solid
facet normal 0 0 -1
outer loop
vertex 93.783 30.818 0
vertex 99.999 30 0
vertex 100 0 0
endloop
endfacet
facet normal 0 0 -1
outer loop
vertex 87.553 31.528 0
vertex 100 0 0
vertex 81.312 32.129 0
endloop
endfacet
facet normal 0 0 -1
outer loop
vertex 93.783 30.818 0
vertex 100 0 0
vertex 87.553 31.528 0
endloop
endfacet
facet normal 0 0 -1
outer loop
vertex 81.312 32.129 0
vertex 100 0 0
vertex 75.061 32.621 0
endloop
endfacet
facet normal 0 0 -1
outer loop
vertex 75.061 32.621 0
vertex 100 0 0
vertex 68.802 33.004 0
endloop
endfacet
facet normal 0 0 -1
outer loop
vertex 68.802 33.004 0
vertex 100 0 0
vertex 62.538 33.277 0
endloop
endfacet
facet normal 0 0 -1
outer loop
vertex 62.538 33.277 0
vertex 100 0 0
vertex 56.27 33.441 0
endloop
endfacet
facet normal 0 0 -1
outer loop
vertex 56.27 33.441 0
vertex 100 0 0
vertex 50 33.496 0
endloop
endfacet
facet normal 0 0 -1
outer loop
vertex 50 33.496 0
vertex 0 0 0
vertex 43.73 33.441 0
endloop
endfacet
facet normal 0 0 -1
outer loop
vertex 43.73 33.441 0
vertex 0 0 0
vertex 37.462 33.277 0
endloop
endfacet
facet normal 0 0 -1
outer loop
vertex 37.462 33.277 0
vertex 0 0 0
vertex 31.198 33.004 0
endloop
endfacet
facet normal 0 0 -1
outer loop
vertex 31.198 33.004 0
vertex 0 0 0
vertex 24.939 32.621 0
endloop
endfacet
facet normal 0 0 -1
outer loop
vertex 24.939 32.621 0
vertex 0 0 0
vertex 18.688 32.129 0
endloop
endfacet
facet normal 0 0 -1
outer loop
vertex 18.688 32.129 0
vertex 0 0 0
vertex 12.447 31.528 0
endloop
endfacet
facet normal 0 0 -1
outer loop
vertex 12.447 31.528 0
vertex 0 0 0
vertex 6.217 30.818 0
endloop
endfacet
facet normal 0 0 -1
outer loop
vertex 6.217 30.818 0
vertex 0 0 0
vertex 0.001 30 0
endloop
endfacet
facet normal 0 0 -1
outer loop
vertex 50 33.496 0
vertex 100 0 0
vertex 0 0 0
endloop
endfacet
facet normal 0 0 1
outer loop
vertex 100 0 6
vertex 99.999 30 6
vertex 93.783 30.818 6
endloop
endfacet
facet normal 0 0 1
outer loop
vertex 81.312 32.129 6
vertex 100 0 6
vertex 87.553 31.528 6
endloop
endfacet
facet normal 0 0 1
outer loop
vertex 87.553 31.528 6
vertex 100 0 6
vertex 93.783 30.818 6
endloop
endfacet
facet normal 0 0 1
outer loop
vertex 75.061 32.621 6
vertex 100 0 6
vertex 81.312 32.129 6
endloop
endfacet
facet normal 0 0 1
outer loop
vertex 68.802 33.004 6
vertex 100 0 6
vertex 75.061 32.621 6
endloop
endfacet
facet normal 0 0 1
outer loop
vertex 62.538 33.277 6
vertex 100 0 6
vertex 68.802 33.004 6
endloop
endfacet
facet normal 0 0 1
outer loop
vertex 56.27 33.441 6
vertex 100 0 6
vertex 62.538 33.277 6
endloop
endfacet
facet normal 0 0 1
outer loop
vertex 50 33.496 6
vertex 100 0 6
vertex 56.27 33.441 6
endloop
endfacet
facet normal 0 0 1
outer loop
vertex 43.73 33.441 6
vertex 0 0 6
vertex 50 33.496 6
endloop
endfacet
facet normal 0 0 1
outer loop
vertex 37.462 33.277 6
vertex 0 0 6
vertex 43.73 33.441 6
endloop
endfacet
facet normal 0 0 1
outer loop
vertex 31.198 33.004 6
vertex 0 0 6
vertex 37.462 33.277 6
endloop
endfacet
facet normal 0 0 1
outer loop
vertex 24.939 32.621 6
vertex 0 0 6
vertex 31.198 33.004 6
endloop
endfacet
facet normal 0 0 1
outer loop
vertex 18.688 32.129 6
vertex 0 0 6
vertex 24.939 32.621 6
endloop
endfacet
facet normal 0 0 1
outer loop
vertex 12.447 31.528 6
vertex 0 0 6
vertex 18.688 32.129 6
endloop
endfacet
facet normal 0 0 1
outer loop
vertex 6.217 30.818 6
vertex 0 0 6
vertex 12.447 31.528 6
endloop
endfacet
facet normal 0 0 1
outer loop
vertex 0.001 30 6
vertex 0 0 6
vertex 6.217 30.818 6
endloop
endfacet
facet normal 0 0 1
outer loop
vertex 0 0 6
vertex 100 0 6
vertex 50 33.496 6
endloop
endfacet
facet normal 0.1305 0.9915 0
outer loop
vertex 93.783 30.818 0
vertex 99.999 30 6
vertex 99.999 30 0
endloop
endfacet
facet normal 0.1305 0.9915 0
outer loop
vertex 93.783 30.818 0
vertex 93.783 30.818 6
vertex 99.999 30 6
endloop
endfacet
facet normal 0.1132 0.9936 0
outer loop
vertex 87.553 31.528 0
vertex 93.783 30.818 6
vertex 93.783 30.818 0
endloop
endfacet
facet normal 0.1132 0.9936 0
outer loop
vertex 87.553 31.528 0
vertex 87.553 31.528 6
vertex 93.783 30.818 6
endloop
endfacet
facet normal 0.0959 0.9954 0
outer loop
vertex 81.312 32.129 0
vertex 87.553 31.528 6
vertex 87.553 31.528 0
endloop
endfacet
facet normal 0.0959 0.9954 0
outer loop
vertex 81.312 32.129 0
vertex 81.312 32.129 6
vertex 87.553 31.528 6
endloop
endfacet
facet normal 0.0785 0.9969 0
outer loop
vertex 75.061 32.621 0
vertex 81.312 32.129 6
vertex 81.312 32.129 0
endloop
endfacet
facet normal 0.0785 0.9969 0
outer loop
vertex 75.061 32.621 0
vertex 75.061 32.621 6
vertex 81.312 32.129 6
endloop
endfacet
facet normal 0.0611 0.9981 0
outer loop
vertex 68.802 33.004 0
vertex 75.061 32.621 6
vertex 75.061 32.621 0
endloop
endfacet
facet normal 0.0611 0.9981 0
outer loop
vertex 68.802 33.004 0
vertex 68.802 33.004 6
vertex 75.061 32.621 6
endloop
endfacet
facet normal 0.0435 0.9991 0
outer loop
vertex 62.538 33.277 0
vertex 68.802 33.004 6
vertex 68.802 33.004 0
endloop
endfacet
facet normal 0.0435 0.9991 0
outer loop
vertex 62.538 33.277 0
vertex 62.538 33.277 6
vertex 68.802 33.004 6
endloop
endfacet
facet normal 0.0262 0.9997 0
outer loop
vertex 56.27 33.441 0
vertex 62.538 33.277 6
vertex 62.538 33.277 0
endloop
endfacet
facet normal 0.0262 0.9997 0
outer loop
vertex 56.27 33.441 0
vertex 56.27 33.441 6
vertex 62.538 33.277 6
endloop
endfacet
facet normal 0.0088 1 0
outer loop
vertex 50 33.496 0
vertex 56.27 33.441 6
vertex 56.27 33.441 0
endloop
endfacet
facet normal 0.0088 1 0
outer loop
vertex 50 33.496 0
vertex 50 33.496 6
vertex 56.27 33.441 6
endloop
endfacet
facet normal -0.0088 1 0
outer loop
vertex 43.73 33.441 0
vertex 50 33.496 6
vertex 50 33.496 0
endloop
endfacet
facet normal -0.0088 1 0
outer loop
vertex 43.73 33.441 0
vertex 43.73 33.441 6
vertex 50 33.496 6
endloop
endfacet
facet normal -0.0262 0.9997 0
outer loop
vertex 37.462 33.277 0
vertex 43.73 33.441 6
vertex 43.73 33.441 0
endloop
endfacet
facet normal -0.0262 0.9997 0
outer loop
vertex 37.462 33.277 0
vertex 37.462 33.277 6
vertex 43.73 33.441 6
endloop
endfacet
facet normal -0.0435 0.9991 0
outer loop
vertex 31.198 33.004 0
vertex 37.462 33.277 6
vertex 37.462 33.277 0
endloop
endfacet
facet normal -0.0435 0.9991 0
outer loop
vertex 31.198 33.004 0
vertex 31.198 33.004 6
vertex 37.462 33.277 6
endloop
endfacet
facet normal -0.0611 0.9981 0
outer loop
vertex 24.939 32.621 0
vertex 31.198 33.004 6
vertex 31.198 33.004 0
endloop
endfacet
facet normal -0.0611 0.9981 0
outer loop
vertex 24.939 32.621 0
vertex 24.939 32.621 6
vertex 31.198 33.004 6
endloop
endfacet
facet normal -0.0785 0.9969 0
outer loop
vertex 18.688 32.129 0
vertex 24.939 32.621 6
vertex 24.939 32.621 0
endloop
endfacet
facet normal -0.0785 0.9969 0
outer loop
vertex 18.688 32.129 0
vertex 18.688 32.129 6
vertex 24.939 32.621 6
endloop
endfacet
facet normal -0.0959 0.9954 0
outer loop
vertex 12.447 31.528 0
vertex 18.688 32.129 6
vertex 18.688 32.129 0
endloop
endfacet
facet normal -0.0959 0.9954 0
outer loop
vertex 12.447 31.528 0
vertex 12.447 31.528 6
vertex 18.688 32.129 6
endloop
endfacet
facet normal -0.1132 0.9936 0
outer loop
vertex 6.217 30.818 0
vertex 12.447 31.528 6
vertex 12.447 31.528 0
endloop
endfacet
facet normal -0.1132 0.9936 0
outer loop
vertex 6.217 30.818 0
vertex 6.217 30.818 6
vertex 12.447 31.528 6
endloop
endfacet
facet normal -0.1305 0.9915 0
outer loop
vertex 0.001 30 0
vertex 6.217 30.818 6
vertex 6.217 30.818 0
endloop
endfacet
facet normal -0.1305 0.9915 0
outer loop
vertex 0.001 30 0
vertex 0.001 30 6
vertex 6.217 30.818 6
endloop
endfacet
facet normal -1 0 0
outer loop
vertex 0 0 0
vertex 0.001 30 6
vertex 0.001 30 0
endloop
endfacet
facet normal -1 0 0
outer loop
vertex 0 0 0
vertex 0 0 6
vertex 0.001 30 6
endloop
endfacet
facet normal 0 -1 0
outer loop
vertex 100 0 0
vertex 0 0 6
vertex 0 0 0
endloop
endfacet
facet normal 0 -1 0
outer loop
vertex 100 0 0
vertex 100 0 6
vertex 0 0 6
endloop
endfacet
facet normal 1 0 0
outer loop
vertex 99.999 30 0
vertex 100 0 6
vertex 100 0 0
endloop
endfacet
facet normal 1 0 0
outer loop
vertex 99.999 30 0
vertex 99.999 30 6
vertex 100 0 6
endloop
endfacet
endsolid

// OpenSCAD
$fn = 32;

// ----------------------------------------------------------------------
// Arc profile plate: crown, 19 points
// ----------------------------------------------------------------------

// --- parameters (mm) ---
bar_l = 100;              // bar length, X
bar_w = 30;               // bar height at the ends, Y
arc_r = 359.26;           // radius of the crown arc
arc_angle = 16;           // crown arc angle, degrees
crown_rise = 3.5;         // rise of the crown over the ends
arc_step = 1;             // sampling step of the crown arc, degrees
plate_t = 6;              // plate thickness, Z
fit_tol = 0.05;           // declared fit tolerance (prompt contract)
free_tol = 0.2;           // declared free tolerance (prompt contract)

bbox_y = bar_w + crown_rise;  // full height with the crown

profile = [[99.999, 30], [93.783, 30.818], [87.553, 31.528], [81.312, 32.129], [75.061, 32.621], [68.802, 33.004], [62.538, 33.277], [56.27, 33.441], [50, 33.496], [43.73, 33.441], [37.462, 33.277], [31.198, 33.004], [24.939, 32.621], [18.688, 32.129], [12.447, 31.528], [6.217, 30.818], [0.001, 30], [0, 0], [100, 0]];  // primary outline, 19 points, counter clockwise

// --- the one profile operation ---
linear_extrude(height = plate_t) polygon(points = profile);
